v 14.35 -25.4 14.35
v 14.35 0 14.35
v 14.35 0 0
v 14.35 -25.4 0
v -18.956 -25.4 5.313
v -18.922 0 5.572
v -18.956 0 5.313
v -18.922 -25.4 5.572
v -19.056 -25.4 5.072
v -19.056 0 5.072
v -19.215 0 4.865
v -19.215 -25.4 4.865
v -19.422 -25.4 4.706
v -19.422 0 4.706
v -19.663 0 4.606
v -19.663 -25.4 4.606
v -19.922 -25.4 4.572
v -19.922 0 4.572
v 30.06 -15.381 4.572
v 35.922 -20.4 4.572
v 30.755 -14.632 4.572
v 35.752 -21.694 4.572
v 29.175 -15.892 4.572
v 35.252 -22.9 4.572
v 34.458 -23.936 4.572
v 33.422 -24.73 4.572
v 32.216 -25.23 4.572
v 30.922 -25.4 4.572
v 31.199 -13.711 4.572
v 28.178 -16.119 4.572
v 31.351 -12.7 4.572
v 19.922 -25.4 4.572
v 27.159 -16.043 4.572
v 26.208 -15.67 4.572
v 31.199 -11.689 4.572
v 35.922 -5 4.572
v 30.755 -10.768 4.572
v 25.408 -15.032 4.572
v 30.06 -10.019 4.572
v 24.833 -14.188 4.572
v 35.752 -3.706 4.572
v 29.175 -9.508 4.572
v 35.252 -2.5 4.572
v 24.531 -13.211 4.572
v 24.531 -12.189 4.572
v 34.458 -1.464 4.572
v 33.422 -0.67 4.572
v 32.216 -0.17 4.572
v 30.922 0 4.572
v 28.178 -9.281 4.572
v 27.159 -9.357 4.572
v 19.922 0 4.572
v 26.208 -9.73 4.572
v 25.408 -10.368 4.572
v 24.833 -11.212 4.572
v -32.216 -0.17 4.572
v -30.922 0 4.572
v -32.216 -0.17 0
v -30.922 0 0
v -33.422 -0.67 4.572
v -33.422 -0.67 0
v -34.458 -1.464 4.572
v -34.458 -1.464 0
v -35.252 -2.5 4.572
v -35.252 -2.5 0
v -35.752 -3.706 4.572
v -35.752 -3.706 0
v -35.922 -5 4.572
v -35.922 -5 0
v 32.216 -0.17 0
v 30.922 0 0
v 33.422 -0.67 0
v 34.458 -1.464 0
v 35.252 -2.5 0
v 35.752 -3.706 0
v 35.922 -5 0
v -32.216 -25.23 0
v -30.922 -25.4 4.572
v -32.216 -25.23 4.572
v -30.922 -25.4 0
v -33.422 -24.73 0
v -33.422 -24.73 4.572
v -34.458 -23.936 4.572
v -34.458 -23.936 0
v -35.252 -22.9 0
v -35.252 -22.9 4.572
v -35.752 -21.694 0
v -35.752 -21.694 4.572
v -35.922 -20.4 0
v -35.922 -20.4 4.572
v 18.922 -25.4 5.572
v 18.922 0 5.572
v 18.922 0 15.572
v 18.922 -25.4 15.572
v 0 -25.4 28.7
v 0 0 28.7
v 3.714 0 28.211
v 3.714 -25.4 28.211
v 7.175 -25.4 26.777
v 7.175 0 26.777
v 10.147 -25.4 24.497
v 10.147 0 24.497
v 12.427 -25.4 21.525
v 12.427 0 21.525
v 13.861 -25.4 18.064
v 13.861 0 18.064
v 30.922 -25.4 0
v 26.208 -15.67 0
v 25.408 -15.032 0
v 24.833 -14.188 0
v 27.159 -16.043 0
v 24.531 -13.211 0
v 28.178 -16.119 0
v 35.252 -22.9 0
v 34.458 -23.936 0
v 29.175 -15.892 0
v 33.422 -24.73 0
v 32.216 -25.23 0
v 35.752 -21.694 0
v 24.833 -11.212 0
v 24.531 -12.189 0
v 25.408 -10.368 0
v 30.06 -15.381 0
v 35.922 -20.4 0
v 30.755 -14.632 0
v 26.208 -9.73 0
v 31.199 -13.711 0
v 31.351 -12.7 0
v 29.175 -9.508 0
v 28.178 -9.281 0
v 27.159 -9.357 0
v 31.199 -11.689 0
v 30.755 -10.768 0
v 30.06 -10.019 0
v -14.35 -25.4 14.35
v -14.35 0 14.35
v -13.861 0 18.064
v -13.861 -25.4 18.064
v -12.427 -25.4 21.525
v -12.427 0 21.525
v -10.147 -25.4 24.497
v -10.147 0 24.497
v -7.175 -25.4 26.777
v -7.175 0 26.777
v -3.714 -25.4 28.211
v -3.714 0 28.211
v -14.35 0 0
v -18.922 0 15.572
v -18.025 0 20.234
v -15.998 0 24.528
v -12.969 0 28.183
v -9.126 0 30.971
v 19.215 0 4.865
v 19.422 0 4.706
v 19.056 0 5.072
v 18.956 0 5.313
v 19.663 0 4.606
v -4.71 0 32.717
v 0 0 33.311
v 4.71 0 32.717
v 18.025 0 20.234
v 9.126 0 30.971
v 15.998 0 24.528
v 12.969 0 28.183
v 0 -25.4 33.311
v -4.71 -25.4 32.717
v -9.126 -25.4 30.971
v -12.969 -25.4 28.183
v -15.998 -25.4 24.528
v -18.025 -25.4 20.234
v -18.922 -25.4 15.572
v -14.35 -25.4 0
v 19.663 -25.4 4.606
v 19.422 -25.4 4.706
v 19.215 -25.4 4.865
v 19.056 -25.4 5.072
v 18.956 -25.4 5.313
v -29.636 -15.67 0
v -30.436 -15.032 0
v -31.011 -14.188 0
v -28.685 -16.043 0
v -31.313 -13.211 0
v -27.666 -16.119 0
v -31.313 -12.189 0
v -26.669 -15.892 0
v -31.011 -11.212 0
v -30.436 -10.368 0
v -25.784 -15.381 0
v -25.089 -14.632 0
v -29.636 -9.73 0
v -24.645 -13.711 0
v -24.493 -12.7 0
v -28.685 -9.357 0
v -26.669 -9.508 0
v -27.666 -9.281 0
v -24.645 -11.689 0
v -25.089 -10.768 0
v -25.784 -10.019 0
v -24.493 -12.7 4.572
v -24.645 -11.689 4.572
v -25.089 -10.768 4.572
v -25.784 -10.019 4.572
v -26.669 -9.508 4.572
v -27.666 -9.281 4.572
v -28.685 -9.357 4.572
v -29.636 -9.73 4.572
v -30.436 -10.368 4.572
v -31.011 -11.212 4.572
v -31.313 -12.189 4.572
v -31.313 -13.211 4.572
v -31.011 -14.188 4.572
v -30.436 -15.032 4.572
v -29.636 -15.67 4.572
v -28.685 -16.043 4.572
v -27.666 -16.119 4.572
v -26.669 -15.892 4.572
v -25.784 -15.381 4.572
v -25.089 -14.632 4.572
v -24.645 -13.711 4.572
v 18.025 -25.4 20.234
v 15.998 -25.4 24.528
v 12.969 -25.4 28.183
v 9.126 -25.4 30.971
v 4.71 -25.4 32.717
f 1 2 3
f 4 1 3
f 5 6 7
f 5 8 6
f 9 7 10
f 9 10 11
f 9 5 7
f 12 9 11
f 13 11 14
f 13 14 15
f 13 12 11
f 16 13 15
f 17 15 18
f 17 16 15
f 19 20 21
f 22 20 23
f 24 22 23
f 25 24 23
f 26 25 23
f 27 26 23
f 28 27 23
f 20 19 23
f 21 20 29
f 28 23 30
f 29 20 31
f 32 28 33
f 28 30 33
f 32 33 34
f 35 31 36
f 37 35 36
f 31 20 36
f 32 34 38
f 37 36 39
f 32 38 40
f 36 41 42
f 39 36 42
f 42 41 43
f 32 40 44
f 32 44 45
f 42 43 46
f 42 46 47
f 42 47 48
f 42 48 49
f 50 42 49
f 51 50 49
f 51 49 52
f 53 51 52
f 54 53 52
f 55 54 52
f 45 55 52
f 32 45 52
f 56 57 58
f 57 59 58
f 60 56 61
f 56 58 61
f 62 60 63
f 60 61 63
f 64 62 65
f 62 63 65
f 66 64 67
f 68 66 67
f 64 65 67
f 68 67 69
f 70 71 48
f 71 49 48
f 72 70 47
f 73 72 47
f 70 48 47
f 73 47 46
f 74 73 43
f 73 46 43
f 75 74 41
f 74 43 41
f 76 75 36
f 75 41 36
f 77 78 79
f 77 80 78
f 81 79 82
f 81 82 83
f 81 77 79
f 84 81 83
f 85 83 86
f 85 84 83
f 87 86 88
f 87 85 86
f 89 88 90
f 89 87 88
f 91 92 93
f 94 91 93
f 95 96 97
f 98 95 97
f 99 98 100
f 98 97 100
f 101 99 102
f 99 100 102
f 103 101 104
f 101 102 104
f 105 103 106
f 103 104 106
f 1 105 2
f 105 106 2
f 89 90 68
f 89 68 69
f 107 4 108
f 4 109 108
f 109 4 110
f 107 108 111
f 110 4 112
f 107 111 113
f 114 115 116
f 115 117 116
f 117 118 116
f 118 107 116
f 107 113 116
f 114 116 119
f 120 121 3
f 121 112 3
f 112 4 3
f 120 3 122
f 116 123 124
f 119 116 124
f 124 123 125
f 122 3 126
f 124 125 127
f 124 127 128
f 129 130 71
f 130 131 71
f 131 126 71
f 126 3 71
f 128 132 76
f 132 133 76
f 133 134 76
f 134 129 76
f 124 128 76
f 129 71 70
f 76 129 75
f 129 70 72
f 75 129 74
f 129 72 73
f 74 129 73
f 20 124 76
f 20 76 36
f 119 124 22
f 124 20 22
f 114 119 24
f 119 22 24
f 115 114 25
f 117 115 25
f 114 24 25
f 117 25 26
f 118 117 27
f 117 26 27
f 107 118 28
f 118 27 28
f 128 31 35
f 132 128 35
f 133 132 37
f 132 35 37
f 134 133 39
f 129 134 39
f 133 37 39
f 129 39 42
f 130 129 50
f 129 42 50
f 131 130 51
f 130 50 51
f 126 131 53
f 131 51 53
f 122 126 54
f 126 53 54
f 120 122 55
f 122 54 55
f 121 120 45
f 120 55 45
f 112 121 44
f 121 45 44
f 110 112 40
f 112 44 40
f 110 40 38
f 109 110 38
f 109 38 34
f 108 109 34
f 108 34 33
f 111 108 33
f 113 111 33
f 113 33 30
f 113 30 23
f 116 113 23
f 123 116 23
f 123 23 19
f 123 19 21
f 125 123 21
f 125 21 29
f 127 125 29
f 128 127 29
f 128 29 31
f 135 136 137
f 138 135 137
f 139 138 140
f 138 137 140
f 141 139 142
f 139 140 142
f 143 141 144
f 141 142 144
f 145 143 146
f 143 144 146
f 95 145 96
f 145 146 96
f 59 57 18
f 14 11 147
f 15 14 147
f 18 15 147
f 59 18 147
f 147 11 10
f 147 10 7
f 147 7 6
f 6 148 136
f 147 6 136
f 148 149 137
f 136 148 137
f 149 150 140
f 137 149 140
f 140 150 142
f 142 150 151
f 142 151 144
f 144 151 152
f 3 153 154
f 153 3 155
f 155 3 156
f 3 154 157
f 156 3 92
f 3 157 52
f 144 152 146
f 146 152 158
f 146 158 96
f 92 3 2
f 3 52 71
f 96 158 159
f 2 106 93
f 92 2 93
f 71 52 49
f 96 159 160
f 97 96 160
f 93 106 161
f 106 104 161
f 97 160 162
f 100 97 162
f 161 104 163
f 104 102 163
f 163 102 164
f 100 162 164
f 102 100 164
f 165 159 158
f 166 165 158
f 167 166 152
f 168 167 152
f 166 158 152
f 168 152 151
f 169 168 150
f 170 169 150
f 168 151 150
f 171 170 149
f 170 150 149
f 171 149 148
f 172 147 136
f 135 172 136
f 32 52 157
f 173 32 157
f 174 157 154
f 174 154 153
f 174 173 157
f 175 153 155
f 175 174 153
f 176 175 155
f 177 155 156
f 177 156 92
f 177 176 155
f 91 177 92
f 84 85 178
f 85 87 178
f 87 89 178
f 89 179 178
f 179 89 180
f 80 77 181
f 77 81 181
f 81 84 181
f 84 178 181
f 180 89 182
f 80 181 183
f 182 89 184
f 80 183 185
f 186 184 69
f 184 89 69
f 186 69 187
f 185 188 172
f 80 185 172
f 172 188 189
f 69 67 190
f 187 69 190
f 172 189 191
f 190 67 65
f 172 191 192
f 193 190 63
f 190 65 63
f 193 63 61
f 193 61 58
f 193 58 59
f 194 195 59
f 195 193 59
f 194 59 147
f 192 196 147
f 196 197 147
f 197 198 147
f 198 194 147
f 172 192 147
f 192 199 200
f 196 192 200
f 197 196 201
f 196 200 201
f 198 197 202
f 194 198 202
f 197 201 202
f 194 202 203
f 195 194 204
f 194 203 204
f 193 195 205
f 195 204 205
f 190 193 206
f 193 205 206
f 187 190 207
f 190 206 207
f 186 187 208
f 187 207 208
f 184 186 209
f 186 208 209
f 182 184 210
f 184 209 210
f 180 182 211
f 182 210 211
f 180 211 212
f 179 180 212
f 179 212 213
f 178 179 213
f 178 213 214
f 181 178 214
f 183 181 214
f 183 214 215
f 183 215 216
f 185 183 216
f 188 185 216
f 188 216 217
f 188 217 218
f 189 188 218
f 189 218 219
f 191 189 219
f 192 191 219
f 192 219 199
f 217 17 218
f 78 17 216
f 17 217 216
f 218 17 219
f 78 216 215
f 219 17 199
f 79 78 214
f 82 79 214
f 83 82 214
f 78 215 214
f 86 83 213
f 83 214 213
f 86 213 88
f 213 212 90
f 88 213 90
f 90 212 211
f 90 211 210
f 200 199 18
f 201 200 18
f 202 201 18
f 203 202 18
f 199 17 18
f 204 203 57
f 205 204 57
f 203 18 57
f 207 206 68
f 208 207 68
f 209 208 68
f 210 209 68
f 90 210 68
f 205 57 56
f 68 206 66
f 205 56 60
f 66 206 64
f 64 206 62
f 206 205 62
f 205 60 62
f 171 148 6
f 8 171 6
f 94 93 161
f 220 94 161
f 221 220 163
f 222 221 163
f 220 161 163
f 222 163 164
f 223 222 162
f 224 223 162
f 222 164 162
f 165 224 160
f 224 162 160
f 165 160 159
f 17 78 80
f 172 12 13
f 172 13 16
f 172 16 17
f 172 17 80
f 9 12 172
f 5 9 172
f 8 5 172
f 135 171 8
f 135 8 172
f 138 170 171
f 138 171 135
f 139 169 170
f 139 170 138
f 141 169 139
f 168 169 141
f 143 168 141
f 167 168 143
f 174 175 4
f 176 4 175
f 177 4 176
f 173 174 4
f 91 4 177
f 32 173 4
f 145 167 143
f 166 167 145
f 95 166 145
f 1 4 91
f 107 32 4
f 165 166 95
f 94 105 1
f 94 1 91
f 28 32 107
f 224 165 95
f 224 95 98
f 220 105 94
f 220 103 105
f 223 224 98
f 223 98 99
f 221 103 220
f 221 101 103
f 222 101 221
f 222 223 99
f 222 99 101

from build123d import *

# Parameters (mm, degrees)
F2_DEPTH = 25.4
F3_R     = 1
F4_R     = 5
F5_R     = 3.429
F6_DEPTH = 4.573


with BuildPart() as f2:
    # F1 (on Front) → F2 (new body)
    with BuildSketch(Plane.XZ):
        with BuildLine():
            ThreePointArc((0, 28.7), (10.14698231, 24.49698231), (14.35, 14.35))
            Line((14.35, 14.35), (14.35, 0))
            Line((14.35, 0), (35.922, 0))
            Line((35.922, 0), (35.922, 4.572))
            Line((35.922, 4.572), (18.922, 4.572))
            Line((18.922, 4.572), (18.922, 15.572))
            ThreePointArc((18.922, 15.572), (12.9685102335, 28.1830441452), (0, 33.3114178795))
            ThreePointArc((0, 33.3114178795), (-12.9685102335, 28.1830441452), (-18.922, 15.572))
            Line((-18.922, 15.572), (-18.922, 4.572))
            Line((-18.922, 4.572), (-35.922, 4.572))
            Line((-35.922, 4.572), (-35.922, 0))
            Line((-35.922, 0), (-14.35, 0))
            Line((-14.35, 0), (-14.35, 14.35))
            ThreePointArc((-14.35, 14.35), (-10.14698231, 24.49698231), (0, 28.7))
        make_face()
    extrude(amount=F2_DEPTH)

    # F3
    f3_edges = [f2.edges().sort_by_distance(p)[0] for p in [
        (-18.922, -12.7, 4.572),
        (18.922, -12.7, 4.572),
    ]]
    fillet(f3_edges, radius=F3_R)

    # F4
    f4_edges = [f2.edges().sort_by_distance(p)[0] for p in [
        (-35.922, -25.4, 2.286),
        (35.922, -25.4, 2.286),
        (35.922, 0, 2.286),
        (-35.922, 0, 2.286),
    ]]
    fillet(f4_edges, radius=F4_R)

    # F5 (on face) → F6 (cut, through all)
    with BuildSketch(Plane.XY.offset(4.572)):
        with Locations((-27.922, -12.7)):
            Circle(F5_R)
        with Locations((27.922, -12.7)):
            Circle(F5_R)
    extrude(amount=-F6_DEPTH, mode=Mode.SUBTRACT)


solid = f2.part
